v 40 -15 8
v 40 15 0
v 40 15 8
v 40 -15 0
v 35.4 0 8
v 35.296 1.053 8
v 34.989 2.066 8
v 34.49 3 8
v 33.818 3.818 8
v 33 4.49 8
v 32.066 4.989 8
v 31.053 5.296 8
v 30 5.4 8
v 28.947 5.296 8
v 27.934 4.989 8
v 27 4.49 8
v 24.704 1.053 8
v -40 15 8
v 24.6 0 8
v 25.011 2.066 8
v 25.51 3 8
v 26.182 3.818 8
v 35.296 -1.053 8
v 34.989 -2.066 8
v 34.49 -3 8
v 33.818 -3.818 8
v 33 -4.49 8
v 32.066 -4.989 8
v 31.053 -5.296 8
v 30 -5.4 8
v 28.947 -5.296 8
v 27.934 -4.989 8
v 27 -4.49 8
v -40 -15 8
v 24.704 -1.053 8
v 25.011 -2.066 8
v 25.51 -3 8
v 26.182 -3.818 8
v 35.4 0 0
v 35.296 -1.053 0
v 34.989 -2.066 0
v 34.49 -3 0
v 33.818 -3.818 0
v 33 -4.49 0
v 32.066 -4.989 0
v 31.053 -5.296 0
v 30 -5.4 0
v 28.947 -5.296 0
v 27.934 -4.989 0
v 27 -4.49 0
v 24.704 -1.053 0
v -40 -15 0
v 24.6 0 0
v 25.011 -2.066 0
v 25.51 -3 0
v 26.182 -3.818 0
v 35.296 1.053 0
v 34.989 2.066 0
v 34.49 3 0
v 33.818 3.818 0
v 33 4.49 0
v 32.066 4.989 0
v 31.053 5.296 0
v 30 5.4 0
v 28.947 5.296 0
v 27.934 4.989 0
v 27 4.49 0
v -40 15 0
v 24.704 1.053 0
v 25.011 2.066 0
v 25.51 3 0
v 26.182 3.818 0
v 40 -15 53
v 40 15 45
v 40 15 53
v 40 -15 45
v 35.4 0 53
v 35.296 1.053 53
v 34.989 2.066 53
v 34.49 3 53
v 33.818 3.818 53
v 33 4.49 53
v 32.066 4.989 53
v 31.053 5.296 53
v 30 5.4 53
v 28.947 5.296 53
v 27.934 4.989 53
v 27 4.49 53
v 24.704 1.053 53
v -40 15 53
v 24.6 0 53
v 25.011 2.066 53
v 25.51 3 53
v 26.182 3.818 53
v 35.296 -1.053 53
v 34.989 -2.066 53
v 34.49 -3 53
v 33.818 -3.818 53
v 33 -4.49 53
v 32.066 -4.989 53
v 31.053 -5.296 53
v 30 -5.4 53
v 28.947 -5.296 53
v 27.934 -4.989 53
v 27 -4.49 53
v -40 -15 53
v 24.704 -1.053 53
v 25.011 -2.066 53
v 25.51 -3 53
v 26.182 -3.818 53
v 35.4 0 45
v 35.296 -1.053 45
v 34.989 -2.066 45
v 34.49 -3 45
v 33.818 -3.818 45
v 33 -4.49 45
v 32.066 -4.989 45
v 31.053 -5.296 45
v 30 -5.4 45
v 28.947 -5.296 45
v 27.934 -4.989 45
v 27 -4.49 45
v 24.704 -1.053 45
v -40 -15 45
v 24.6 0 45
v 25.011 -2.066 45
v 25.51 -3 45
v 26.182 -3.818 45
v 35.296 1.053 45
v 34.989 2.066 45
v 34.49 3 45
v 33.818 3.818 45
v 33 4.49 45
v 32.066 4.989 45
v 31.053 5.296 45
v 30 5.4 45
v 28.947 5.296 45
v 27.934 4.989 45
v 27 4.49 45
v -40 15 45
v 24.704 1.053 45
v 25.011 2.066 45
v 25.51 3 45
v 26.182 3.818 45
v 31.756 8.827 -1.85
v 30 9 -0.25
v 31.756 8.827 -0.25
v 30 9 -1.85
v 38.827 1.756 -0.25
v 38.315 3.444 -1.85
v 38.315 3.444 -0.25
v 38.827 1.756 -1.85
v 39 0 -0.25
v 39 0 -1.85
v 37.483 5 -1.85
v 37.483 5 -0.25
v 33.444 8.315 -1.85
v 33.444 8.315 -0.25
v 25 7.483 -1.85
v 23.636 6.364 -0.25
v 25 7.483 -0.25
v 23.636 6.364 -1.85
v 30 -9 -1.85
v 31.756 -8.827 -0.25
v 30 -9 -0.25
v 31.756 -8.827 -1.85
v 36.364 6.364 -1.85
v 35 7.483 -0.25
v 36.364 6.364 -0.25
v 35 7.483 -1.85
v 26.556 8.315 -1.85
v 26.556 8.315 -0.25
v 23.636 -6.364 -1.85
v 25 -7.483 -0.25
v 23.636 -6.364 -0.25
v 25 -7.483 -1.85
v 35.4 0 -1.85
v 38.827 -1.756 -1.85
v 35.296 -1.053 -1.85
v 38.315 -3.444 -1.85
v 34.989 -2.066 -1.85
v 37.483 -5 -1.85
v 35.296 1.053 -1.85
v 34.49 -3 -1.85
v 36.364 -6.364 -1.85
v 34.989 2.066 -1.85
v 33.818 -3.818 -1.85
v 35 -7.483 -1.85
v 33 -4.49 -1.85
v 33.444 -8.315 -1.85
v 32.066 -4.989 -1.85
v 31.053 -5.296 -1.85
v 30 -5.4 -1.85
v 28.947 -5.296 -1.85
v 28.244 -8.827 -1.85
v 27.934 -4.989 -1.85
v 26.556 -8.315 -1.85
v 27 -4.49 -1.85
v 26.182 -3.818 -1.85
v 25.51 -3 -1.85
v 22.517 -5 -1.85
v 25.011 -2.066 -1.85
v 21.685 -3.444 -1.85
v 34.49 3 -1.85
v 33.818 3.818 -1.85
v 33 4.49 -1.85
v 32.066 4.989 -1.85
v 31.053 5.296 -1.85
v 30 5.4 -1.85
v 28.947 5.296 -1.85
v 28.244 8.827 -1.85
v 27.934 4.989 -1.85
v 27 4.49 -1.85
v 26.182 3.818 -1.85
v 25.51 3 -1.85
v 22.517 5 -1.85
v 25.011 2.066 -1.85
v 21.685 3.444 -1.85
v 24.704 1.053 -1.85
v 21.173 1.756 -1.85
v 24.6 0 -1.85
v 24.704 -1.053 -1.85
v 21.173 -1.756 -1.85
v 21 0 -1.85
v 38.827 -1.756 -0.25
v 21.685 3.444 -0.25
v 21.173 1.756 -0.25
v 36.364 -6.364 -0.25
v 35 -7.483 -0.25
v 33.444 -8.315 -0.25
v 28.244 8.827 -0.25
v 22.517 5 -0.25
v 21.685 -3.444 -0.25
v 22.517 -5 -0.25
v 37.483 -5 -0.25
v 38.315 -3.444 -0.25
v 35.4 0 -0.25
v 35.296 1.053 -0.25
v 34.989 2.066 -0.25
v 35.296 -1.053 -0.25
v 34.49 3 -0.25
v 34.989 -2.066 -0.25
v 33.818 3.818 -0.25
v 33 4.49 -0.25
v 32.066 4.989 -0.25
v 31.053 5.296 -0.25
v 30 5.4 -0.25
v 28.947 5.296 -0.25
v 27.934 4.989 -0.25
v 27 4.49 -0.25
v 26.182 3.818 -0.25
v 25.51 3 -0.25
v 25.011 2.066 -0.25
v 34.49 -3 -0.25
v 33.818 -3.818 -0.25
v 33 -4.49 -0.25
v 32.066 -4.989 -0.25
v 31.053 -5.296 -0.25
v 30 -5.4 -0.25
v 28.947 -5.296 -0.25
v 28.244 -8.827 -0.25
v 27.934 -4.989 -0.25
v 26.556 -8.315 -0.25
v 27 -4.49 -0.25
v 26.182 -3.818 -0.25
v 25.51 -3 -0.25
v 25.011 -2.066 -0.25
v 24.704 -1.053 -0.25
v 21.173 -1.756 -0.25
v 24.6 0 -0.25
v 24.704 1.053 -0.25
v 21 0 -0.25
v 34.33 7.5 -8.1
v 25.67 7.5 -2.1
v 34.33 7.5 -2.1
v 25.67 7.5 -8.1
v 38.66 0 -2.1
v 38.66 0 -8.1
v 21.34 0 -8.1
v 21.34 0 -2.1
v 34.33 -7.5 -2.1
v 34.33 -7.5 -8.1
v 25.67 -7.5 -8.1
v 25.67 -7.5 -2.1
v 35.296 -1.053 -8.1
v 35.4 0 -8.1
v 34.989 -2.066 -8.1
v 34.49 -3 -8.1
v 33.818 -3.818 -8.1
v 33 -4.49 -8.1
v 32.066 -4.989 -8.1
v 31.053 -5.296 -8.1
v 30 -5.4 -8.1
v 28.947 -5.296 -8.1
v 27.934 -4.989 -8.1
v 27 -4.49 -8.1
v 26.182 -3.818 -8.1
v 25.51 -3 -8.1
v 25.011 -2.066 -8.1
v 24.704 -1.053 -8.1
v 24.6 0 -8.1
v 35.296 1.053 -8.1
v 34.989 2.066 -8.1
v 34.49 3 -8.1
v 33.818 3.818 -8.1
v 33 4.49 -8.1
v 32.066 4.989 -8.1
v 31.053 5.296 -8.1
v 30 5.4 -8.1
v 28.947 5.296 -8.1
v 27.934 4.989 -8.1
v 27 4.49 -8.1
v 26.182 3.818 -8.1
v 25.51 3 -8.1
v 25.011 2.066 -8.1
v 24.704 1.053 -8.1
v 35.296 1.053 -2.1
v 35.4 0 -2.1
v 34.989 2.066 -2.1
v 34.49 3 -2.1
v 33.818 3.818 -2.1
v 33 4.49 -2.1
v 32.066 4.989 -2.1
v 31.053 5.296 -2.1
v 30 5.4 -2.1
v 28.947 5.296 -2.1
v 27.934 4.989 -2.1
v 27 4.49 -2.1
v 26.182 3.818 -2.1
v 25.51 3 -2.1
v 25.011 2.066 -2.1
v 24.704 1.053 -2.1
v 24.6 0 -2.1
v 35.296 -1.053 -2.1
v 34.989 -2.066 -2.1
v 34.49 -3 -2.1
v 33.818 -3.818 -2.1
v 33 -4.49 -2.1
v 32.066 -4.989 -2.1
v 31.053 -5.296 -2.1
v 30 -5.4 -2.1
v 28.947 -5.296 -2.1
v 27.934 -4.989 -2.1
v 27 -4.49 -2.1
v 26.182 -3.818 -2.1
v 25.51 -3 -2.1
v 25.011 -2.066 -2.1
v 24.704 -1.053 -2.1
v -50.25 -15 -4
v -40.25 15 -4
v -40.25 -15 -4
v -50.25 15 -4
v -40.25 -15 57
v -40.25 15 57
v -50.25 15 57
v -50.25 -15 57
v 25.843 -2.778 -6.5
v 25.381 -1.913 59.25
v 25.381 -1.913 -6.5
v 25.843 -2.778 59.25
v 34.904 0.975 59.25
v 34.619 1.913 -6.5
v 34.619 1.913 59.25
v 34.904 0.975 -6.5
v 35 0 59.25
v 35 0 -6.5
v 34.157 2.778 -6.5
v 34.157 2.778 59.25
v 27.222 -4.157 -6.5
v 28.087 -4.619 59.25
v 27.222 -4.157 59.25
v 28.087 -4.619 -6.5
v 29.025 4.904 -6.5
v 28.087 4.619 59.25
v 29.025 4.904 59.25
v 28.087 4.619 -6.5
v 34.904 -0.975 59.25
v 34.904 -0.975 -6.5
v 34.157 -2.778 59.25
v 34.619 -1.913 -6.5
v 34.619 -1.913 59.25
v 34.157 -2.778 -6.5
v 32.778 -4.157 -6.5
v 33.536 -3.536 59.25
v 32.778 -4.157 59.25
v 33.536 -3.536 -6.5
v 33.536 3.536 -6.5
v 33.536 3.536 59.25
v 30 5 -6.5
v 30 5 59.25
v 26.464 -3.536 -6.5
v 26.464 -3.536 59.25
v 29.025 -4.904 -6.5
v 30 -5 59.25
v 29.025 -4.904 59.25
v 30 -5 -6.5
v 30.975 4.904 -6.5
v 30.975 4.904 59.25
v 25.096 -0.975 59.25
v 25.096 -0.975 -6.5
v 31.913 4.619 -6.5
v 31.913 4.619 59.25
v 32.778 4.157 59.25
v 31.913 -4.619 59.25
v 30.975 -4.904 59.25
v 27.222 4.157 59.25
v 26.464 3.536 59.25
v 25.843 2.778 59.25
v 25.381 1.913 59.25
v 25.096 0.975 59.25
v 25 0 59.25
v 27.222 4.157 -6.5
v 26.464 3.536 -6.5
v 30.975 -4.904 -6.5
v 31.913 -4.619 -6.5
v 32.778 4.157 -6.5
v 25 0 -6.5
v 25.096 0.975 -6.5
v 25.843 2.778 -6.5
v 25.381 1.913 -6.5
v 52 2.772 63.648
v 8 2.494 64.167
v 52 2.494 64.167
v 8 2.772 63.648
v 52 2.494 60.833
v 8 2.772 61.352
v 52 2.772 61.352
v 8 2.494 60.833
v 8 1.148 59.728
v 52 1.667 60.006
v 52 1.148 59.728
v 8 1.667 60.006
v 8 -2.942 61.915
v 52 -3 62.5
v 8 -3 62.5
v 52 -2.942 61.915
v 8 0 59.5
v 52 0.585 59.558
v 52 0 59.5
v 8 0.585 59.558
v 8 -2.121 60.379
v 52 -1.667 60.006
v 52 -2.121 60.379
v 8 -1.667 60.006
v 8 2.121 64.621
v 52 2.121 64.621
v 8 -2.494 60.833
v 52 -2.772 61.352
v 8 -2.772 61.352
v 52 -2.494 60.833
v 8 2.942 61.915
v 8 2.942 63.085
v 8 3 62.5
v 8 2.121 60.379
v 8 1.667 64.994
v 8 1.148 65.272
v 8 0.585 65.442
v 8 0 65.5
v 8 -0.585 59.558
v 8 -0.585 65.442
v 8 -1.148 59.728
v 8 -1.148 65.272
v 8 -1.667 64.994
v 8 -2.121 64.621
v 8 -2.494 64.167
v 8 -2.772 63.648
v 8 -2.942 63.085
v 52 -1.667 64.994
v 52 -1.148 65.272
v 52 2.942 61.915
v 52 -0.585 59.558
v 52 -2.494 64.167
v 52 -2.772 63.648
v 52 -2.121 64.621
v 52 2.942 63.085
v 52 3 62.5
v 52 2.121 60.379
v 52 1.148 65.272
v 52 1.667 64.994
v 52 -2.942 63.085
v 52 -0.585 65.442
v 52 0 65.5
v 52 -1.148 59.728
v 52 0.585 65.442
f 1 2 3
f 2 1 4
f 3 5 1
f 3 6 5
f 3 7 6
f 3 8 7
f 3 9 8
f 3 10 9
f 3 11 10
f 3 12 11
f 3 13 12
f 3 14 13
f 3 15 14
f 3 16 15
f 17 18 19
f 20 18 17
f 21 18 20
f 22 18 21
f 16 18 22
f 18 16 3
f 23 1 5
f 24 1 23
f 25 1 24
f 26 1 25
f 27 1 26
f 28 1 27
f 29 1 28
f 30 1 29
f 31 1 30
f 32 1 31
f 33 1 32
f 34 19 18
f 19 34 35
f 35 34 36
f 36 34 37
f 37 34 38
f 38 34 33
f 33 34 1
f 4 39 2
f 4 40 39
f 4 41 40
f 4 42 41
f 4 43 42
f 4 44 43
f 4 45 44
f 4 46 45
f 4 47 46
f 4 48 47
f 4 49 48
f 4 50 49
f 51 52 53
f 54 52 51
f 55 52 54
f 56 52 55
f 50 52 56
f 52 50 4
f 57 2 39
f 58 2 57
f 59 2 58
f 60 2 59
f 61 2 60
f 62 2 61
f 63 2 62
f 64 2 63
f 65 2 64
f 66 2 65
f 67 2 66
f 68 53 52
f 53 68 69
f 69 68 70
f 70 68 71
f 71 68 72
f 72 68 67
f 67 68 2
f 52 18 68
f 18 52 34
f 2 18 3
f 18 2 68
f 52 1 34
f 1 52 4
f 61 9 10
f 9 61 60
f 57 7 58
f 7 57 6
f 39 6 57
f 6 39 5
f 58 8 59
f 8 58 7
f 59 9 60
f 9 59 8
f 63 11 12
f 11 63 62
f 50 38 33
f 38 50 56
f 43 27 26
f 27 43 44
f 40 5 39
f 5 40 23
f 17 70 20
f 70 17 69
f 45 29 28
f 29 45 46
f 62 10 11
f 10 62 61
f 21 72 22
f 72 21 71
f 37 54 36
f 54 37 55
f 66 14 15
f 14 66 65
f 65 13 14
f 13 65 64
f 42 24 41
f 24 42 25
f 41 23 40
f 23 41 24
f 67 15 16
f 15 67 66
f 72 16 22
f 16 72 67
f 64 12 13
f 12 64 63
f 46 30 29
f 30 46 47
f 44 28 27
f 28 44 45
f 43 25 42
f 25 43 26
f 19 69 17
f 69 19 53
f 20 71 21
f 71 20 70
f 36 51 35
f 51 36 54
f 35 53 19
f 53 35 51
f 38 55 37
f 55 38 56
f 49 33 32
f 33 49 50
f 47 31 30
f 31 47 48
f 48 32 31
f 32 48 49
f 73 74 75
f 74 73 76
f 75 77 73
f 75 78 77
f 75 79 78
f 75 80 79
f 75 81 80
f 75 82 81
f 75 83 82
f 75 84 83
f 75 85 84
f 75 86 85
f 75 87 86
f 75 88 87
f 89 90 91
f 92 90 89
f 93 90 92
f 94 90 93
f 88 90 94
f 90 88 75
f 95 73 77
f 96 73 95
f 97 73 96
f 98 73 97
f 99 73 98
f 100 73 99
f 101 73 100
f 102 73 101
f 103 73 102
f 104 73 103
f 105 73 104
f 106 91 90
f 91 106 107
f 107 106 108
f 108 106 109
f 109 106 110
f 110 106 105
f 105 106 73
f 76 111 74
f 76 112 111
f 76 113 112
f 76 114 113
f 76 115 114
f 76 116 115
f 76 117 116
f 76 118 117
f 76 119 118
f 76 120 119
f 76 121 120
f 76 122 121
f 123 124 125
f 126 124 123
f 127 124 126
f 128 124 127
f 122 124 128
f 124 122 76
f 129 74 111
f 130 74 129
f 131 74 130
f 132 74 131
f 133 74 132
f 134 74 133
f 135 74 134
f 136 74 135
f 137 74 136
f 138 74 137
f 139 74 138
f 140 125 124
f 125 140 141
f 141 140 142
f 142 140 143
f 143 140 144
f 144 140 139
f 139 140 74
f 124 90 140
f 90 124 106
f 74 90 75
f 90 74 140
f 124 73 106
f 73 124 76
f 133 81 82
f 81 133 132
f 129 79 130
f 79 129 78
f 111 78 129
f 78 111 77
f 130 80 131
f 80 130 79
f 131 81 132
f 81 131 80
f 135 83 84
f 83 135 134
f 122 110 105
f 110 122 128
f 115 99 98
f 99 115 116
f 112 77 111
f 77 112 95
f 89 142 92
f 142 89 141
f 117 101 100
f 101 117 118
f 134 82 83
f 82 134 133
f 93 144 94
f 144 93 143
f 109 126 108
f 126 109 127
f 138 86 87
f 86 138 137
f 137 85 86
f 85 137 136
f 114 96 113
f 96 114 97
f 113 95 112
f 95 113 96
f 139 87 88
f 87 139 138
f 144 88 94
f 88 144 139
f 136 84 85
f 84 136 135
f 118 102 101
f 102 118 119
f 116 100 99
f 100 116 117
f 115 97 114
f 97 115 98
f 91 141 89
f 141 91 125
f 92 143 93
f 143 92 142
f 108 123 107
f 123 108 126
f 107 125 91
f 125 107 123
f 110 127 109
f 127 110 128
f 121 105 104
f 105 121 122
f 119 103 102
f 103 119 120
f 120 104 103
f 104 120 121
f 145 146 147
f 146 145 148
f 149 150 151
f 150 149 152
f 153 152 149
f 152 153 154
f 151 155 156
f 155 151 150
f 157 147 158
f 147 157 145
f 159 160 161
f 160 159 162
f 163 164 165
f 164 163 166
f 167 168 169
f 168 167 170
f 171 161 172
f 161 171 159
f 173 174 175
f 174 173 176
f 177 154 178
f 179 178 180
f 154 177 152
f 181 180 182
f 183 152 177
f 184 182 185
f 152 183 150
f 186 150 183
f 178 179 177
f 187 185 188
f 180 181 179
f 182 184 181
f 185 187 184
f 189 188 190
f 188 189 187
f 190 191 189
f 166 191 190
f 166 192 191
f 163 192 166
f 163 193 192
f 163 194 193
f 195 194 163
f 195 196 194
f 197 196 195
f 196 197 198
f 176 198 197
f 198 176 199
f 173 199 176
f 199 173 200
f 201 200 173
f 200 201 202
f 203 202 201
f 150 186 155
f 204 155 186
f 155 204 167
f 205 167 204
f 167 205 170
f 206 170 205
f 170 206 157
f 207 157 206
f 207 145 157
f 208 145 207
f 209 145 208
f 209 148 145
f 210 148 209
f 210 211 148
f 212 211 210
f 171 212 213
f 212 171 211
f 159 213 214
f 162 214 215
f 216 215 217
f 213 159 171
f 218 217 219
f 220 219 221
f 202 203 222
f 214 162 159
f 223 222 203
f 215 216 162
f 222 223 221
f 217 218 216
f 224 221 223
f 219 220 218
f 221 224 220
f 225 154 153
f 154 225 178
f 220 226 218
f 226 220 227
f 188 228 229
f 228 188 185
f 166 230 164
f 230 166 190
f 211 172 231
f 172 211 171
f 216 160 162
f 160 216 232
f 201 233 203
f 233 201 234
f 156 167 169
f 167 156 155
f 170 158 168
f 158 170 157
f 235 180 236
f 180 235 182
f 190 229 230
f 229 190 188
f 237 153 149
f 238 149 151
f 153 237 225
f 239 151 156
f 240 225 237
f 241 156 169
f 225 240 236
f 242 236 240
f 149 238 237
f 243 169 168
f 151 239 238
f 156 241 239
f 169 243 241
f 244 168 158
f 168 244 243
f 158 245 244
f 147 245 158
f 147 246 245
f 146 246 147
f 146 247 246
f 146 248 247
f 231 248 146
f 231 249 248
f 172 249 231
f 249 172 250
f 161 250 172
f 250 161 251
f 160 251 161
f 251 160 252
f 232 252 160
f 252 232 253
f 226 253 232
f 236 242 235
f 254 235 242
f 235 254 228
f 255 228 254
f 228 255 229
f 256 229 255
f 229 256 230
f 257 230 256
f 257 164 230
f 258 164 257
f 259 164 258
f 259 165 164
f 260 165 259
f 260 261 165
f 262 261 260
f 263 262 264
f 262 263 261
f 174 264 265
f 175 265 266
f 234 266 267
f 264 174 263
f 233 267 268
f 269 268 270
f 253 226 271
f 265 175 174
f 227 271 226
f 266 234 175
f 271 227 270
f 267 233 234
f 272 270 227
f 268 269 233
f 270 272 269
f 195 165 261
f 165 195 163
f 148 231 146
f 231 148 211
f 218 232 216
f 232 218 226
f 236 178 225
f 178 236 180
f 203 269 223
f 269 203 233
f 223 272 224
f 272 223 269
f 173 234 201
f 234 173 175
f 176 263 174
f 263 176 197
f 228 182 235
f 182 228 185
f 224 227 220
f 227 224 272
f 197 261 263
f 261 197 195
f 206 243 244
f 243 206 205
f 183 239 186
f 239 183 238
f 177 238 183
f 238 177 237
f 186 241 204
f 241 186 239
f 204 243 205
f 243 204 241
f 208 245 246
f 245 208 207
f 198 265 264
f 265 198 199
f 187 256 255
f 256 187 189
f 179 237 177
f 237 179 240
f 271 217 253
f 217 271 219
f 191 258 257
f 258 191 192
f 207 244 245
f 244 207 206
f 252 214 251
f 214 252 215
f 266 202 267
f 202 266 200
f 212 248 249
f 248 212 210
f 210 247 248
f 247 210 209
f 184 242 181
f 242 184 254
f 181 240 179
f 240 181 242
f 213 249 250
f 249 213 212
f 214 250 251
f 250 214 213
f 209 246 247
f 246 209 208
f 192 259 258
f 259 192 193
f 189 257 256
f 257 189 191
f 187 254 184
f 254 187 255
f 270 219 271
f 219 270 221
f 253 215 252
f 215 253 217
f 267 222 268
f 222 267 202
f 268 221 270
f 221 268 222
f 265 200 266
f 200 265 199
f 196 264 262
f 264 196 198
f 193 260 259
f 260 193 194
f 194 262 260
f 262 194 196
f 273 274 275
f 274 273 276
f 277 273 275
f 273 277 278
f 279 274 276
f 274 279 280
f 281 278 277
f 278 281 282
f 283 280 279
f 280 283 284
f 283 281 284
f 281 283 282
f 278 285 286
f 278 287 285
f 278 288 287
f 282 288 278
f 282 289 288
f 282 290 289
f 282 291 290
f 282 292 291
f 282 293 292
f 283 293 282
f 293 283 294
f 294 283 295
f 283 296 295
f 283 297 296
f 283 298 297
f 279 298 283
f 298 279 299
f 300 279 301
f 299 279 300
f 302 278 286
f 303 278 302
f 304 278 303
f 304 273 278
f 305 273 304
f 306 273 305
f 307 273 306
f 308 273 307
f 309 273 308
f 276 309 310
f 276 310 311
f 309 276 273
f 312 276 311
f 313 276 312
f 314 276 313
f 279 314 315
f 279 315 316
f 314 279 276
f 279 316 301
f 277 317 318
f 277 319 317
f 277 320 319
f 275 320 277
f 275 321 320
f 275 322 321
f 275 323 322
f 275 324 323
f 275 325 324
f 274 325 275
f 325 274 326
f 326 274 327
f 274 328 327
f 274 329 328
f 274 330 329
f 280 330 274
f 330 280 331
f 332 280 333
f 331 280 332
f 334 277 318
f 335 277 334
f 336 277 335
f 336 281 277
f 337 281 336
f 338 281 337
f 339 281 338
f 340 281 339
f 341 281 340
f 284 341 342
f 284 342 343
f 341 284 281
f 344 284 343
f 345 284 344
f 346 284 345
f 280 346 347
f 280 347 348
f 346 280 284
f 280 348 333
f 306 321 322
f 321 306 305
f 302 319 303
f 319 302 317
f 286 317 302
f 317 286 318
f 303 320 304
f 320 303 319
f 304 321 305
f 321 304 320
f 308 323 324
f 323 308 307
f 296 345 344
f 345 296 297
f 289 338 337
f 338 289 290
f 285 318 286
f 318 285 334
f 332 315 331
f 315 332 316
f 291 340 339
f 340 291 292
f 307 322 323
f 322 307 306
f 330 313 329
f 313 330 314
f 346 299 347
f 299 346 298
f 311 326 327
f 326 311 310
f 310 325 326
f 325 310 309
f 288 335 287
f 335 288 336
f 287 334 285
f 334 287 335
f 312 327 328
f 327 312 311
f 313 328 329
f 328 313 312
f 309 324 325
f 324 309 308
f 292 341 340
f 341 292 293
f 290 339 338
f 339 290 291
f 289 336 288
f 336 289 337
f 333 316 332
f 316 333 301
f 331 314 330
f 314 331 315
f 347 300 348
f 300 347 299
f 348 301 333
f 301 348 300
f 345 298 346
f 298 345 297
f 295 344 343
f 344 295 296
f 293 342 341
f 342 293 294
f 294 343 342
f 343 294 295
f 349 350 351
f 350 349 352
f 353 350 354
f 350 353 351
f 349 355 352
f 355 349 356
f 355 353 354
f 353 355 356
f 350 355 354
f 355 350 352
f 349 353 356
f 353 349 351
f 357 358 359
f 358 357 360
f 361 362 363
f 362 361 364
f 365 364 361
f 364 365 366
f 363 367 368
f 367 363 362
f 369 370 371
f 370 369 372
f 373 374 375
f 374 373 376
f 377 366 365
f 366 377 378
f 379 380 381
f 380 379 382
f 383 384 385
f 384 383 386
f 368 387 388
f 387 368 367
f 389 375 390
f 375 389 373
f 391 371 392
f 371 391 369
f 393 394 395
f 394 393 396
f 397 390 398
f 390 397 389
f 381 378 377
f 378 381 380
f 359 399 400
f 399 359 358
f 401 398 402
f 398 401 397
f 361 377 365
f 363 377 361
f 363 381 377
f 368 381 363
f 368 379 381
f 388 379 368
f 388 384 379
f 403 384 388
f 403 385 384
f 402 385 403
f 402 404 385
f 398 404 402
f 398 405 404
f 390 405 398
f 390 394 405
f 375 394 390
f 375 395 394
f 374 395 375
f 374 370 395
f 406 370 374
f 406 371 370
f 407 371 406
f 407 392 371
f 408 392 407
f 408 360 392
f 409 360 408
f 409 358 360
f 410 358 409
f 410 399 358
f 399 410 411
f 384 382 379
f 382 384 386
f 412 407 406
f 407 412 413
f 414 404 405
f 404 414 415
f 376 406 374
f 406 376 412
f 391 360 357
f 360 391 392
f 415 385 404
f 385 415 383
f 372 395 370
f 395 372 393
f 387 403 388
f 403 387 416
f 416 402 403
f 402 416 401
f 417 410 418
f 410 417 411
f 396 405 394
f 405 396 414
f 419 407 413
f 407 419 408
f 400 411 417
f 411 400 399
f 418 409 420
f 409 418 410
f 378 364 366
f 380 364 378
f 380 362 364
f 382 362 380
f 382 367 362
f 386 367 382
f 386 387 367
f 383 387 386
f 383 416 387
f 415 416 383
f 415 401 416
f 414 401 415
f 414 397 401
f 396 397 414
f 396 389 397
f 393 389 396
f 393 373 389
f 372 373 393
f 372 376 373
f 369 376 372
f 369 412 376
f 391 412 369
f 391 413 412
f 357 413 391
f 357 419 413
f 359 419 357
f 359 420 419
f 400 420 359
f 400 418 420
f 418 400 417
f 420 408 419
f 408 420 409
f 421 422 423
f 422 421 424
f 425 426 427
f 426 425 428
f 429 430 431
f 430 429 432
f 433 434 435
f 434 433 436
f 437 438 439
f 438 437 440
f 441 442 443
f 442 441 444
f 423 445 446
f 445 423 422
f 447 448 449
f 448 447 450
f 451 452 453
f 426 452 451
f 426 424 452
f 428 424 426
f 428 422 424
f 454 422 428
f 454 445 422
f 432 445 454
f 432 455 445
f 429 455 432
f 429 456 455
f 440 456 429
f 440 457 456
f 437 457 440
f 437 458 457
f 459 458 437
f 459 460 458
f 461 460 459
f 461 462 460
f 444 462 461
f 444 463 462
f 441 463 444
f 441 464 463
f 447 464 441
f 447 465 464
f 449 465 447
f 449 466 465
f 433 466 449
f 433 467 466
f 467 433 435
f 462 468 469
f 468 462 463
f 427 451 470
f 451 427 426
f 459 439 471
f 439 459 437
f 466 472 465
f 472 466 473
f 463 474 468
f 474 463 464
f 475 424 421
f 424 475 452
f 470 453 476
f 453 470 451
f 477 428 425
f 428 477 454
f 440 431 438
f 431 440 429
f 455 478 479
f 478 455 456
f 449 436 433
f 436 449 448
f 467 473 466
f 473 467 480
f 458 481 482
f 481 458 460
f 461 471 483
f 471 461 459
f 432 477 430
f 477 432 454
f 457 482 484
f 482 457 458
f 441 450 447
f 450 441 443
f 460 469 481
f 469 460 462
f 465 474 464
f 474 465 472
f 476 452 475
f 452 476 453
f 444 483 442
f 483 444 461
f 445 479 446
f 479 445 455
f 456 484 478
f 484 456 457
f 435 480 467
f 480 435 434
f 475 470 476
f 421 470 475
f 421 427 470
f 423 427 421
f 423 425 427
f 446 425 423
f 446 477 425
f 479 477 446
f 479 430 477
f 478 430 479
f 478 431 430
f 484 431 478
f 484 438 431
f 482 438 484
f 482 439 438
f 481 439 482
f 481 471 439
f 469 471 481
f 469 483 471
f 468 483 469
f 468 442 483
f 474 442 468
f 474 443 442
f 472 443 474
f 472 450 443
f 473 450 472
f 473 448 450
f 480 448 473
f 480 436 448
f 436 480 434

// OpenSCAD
$fn = 32;

// ------------------------------------------------------------------------
// C clamp: throat 45 mm, screw d10
// Every part is its own module, assembly() places every instance.
// ------------------------------------------------------------------------

// --- part 1 ---
module clamp_arm() {
  difference() {
    translate([-40, -15, 0]) cube([80, 30, 8]);
    translate([30, 0, -1]) cylinder(h = 10, d = 10.8);
  }
}

// --- part 2 ---
module clamp_spine() {
  difference() {
    translate([-30.5, -15, 0]) cube([61, 30, 10]);
  }
}

// --- part 3 ---
module clamp_screw() {
  translate([0, 0, -32.875]) cylinder(h = 65.75, d = 10);
}

// --- part 4 ---
module clamp_washer() {
  difference() {
      translate([0, 0, 0]) cylinder(h = 1.6, d = 18);
      translate([0, 0, -1]) cylinder(h = 3.6, d = 10.8);
    }
}

// --- part 5 ---
module clamp_nut() {
  difference() {
    linear_extrude(height = 6) polygon(points = [[8.66, 0], [4.33, 7.5], [-4.33, 7.5], [-8.66, 0], [-4.33, -7.5], [4.33, -7.5]]);
    translate([0, 0, -1]) cylinder(h = 8, d = 10.8);
  }
}

// --- part 6 ---
module tommy_bar() {
  translate([0, 0, -22]) cylinder(h = 44, d = 6);
}

// --- assembly ---
module assembly() {
  color([0.80, 0.24, 0.20]) translate([0, 0, 0]) rotate([0, 0, 0]) clamp_arm();
  color([0.20, 0.45, 0.75]) translate([0, 0, 45]) rotate([0, 0, 0]) clamp_arm();
  color([0.25, 0.62, 0.32]) translate([-50.25, 0, 26.5]) rotate([0, 90, 0]) clamp_spine();
  color([0.92, 0.70, 0.18]) translate([30, 0, 26.375]) rotate([0, 0, 0]) clamp_screw();
  color([0.58, 0.35, 0.70]) translate([30, 0, -1.85]) rotate([0, 0, 0]) clamp_washer();
  color([0.16, 0.66, 0.66]) translate([30, 0, -8.1]) rotate([0, 0, 0]) clamp_nut();
  color([0.85, 0.48, 0.18]) translate([30, 0, 62.5]) rotate([0, 90, 0]) tommy_bar();
}

assembly();
